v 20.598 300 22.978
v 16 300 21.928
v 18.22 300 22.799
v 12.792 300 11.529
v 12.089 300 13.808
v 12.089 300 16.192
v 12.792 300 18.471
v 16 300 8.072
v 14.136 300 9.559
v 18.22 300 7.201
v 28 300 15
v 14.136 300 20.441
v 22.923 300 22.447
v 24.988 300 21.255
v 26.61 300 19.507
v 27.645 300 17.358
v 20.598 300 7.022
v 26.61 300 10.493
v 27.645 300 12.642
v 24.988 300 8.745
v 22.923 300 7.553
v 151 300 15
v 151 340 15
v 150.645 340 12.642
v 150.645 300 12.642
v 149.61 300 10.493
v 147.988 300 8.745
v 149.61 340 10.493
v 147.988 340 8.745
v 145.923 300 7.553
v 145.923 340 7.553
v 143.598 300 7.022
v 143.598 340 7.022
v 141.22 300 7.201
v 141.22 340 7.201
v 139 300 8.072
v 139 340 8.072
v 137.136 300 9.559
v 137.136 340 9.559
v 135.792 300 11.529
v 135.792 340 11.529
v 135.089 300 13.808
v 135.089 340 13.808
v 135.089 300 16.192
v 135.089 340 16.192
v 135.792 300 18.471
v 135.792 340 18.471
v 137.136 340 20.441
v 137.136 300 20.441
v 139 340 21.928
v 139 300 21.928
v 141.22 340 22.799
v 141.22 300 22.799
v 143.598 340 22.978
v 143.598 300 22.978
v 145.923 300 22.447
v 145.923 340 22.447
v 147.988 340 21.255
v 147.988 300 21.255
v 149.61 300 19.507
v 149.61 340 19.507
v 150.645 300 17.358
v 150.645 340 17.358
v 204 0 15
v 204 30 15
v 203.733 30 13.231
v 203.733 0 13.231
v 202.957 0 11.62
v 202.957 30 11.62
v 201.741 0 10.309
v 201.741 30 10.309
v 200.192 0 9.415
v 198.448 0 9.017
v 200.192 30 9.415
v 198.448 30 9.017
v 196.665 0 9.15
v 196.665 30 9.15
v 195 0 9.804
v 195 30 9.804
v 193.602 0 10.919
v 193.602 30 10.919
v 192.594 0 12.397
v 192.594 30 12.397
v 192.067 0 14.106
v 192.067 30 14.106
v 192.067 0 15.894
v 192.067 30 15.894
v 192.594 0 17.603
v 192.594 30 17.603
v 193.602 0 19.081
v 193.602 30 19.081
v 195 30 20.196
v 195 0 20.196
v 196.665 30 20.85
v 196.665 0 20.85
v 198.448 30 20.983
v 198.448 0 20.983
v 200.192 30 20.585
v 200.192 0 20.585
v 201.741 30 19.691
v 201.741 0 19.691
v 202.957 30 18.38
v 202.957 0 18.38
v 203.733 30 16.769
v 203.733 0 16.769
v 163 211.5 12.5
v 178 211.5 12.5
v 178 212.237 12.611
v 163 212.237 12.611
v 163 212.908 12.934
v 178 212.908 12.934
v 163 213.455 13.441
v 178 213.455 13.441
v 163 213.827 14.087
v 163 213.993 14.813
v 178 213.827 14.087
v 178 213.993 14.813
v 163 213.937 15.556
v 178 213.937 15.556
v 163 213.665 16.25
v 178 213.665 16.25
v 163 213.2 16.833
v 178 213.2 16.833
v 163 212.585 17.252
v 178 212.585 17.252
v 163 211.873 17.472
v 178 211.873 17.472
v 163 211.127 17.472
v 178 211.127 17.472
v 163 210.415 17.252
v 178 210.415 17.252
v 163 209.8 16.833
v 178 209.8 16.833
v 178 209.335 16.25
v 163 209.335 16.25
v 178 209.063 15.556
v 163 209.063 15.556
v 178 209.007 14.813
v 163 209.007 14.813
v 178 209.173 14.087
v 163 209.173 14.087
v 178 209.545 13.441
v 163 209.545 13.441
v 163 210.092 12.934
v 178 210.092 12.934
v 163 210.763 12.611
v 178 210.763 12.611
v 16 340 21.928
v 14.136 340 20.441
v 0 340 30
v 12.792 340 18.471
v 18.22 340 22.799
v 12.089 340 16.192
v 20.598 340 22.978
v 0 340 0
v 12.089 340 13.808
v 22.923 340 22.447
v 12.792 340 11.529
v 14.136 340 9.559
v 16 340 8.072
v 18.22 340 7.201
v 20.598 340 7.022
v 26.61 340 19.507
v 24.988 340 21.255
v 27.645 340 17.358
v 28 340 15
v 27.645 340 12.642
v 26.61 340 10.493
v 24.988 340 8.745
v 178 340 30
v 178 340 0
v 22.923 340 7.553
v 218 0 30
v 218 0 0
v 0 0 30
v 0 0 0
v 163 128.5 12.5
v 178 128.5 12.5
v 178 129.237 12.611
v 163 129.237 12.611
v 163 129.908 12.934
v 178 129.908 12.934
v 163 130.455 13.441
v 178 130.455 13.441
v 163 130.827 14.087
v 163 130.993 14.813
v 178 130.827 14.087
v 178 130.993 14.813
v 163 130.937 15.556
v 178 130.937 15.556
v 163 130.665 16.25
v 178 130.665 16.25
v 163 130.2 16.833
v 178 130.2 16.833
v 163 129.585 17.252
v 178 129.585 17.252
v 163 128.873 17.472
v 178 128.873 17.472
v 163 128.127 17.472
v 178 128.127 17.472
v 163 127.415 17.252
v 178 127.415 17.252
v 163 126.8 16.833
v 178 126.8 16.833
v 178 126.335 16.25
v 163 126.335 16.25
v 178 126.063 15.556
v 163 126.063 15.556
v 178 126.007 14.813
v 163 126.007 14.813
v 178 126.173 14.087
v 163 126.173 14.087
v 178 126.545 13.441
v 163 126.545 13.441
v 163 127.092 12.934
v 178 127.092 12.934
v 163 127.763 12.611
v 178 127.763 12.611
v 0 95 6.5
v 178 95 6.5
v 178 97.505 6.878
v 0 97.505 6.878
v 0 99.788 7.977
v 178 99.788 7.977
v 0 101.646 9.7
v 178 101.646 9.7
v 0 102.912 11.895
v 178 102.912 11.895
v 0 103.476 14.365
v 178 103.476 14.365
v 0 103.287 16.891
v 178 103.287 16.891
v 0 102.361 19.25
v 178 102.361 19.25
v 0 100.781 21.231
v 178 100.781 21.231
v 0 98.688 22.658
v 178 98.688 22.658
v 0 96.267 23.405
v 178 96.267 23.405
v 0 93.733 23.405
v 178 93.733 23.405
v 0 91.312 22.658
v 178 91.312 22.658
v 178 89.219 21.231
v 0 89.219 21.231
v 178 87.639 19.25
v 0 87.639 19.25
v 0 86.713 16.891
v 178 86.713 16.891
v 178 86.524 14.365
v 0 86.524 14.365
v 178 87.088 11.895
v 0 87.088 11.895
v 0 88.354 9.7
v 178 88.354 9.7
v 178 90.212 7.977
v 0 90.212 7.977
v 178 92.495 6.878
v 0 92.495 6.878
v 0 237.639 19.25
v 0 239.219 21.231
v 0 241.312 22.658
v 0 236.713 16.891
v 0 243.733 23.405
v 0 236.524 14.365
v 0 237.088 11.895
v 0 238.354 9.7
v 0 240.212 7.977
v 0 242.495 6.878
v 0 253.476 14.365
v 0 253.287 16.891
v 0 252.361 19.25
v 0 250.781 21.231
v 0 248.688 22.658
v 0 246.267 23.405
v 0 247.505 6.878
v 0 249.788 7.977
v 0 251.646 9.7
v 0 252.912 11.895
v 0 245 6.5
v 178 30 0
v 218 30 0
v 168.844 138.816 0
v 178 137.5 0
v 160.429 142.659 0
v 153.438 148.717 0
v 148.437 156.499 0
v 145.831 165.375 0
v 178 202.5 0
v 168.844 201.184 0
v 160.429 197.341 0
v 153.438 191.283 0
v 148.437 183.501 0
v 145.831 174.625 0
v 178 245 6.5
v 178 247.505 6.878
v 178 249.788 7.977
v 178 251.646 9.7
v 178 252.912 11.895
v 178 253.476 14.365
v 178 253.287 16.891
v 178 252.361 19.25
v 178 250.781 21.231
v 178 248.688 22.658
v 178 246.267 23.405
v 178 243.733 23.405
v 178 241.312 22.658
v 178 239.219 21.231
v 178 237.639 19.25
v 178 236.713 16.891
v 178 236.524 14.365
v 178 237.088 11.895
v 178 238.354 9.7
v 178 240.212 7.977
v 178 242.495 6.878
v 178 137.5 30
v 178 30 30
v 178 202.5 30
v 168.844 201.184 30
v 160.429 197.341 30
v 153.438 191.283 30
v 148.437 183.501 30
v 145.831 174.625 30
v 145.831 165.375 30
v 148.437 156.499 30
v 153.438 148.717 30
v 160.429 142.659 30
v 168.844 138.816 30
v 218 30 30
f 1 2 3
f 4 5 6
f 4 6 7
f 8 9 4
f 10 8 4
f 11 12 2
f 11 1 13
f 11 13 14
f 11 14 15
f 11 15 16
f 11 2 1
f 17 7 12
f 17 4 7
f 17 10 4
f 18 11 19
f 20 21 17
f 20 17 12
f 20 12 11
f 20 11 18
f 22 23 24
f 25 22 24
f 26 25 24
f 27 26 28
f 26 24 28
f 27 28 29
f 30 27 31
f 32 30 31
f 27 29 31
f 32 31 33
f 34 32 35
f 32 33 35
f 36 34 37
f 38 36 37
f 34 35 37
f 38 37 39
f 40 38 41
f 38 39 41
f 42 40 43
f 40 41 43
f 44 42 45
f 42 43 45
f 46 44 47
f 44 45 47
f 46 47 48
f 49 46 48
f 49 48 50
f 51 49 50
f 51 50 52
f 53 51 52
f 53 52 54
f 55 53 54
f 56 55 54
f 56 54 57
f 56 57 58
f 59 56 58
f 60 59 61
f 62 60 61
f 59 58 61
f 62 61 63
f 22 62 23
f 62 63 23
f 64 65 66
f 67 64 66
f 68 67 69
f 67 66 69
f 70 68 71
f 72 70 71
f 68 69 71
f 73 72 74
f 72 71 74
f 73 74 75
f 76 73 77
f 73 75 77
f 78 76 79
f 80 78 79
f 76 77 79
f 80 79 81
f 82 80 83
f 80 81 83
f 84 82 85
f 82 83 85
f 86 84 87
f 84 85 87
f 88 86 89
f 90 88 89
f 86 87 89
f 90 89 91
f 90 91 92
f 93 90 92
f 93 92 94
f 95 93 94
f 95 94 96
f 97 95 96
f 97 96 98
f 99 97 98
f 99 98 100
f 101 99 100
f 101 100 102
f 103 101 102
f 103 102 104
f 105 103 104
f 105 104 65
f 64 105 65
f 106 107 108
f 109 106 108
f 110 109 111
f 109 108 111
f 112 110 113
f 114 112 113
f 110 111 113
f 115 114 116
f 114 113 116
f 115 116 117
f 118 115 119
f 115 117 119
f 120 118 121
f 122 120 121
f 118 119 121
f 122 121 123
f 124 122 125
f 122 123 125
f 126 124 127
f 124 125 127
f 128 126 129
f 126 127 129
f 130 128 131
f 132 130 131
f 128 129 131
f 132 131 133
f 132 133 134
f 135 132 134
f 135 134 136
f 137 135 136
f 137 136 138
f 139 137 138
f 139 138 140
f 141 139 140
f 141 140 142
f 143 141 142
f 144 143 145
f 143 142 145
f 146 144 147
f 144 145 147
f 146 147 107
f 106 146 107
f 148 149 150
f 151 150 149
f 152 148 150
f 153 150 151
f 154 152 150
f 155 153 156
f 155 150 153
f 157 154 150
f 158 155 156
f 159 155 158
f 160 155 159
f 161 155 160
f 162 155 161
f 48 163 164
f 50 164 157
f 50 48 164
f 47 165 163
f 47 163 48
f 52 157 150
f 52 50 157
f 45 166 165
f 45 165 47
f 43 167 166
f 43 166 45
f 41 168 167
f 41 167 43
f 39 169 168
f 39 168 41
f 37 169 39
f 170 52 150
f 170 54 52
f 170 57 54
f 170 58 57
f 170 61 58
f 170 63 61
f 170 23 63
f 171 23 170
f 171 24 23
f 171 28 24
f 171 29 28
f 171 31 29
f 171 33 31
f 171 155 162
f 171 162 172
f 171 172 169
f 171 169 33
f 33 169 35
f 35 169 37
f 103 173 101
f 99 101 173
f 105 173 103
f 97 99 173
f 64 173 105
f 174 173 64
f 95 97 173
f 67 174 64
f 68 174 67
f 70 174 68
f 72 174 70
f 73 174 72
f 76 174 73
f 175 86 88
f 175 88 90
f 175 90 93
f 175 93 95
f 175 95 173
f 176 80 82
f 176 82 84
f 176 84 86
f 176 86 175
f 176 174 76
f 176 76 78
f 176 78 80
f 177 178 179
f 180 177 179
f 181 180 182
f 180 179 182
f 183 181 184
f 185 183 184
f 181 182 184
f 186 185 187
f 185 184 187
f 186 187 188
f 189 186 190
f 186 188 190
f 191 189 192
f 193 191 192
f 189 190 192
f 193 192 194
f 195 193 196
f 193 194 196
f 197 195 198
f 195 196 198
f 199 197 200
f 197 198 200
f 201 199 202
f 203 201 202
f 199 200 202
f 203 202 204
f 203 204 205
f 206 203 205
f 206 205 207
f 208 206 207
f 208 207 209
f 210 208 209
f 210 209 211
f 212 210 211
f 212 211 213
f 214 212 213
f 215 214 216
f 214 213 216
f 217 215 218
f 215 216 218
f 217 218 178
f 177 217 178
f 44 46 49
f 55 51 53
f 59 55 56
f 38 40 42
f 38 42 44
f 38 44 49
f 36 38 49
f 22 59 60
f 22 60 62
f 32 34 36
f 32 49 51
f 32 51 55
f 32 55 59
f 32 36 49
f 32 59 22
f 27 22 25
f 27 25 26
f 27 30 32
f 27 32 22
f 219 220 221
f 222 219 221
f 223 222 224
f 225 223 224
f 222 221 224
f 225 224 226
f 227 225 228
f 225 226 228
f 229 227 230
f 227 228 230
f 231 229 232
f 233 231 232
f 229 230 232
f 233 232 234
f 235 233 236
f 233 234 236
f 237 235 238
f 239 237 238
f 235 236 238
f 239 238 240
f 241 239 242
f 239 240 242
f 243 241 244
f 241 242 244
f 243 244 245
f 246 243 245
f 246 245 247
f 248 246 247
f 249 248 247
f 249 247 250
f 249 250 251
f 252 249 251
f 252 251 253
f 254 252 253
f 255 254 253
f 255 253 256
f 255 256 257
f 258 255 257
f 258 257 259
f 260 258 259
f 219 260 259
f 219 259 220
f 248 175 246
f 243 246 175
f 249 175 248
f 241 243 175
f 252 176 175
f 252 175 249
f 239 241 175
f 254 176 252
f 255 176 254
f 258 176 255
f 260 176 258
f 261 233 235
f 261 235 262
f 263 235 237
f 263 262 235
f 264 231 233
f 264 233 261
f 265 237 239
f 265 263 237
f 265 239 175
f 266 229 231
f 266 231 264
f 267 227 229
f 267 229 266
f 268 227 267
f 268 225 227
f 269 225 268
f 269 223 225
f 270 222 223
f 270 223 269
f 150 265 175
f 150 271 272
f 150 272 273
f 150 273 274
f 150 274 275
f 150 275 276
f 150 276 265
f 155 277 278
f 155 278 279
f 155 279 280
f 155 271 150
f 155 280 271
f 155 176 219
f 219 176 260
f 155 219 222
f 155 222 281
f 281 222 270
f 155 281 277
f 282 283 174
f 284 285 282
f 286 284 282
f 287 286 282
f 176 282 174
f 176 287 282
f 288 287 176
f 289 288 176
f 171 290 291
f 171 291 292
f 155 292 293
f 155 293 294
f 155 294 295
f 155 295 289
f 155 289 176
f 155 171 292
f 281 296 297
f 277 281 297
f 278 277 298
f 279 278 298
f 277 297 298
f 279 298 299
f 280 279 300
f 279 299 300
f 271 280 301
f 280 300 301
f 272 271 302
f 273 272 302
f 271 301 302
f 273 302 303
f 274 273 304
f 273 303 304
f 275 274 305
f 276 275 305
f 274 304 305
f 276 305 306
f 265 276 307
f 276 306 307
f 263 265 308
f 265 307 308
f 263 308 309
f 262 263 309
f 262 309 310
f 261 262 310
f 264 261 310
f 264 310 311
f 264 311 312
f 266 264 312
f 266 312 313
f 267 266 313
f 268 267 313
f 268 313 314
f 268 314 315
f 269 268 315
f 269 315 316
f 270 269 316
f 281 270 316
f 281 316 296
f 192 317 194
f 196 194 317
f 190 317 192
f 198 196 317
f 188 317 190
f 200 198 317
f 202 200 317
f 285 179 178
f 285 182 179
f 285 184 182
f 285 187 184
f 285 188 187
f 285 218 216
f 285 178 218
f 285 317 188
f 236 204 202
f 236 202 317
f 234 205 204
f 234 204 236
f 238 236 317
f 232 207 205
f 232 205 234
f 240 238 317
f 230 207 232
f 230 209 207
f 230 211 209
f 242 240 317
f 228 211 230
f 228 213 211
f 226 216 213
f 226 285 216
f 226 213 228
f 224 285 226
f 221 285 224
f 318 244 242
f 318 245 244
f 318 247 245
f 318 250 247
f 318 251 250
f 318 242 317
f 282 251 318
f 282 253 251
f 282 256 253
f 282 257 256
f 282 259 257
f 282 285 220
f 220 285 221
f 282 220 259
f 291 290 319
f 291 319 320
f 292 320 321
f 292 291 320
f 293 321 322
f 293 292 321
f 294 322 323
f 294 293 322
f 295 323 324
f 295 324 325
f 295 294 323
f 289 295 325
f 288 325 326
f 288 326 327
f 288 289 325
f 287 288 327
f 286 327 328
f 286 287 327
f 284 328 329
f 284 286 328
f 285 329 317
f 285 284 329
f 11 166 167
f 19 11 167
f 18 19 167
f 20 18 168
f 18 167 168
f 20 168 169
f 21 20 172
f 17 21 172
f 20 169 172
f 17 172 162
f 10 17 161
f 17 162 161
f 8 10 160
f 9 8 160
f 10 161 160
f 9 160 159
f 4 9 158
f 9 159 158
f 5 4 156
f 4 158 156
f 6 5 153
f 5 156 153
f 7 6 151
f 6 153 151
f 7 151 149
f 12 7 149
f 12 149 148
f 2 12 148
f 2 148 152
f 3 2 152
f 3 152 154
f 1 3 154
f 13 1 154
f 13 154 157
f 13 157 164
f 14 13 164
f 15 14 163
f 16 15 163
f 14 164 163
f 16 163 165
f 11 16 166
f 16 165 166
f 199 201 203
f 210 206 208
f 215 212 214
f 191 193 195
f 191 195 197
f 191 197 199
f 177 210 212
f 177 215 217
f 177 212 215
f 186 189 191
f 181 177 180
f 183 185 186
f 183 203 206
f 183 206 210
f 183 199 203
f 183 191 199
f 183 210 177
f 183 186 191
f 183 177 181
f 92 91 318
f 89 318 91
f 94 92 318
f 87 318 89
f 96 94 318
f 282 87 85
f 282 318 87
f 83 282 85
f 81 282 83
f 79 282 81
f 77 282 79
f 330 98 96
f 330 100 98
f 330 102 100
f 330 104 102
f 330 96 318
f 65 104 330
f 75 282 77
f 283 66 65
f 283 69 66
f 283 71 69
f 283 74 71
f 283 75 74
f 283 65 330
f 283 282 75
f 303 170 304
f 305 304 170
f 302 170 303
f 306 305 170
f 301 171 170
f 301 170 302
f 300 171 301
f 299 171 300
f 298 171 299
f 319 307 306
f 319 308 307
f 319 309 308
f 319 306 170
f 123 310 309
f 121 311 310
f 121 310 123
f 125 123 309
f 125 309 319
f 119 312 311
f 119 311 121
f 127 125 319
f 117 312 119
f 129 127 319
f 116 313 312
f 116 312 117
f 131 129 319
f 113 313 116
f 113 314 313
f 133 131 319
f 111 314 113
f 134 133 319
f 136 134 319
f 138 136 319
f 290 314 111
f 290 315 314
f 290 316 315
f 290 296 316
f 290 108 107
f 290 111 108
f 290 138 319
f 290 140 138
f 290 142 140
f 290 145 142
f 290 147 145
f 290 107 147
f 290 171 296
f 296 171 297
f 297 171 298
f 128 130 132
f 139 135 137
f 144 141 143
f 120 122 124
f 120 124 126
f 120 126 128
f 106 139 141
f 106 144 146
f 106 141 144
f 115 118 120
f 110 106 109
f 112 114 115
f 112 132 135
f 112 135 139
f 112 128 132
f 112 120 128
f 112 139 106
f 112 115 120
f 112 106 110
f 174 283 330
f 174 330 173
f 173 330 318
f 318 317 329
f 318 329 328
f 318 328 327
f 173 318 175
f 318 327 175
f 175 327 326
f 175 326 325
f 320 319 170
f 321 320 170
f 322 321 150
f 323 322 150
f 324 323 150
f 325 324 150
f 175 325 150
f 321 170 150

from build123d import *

# Parameters (mm, degrees)
BOSS_EXTRUDE1_DEPTH = 30
SKETCH2_R           = 8.5
CUT_EXTRUDE1_DEPTH  = 179
LPATTERN1_COUNT     = 2
LPATTERN1_PITCH     = 150
SKETCH3_R           = 2.5
CUT_EXTRUDE2_DEPTH  = 15
LPATTERN2_COUNT     = 2
LPATTERN2_PITCH     = 83
SKETCH4_R           = 6
CUT_EXTRUDE3_DEPTH  = 31
SKETCH5_R           = 8
CUT_EXTRUDE4_DEPTH  = 40


with BuildPart() as part:
    # Sketch1 → Boss-Extrude1 (new body)
    with BuildSketch(Plane.XY):
        with BuildLine():
            Line((0, 0), (0, 340))
            Line((0, 340), (178, 340))
            Line((178, 340), (178, 202.5))
            ThreePointArc((178, 202.5), (145.5, 170), (178, 137.5))
            Line((178, 137.5), (178, 30))
            Line((178, 30), (218, 30))
            Line((218, 30), (218, 0))
            Line((218, 0), (0, 0))
        make_face()
    extrude(amount=BOSS_EXTRUDE1_DEPTH)

    # Sketch2 → Cut-Extrude1 (cut, through all)
    with BuildSketch(Plane(origin=(178, 0, 0), x_dir=(0, 0, -1), z_dir=(1, 0, 0))):
        with Locations((-15, 95)):
            Circle(SKETCH2_R)
    cut_extrude1 = extrude(amount=-CUT_EXTRUDE1_DEPTH, mode=Mode.SUBTRACT)

    # LPattern1: Cut-Extrude1 ×2
    with Locations(*[(0, i * LPATTERN1_PITCH, 0) for i in range(1, LPATTERN1_COUNT)]):
        add(cut_extrude1, mode=Mode.SUBTRACT)

    # Sketch3 → Cut-Extrude2 (cut)
    with BuildSketch(Plane(origin=(178, 0, 0), x_dir=(0, 0, -1), z_dir=(1, 0, 0))):
        with Locations((-15, 128.5)):
            Circle(SKETCH3_R)
    cut_extrude2 = extrude(amount=-CUT_EXTRUDE2_DEPTH, mode=Mode.SUBTRACT)

    # LPattern2: Cut-Extrude2 ×2
    with Locations(*[(0, i * LPATTERN2_PITCH, 0) for i in range(1, LPATTERN2_COUNT)]):
        add(cut_extrude2, mode=Mode.SUBTRACT)

    # Sketch4 → Cut-Extrude3 (cut, through all)
    with BuildSketch(Plane(origin=(0, 30, 0), x_dir=(1, 0, 0), z_dir=(0, 1, 0))):
        with Locations((198, -15)):
            Circle(SKETCH4_R)
    extrude(amount=-CUT_EXTRUDE3_DEPTH, mode=Mode.SUBTRACT)

    # Sketch5 → Cut-Extrude4 (cut)
    with BuildSketch(Plane(origin=(0, 340, 0), x_dir=(1, 0, 0), z_dir=(0, 1, 0))):
        with Locations((20, -15)):
            Circle(SKETCH5_R)
        with Locations((143, -15)):
            Circle(SKETCH5_R)
    extrude(amount=-CUT_EXTRUDE4_DEPTH, mode=Mode.SUBTRACT)


solid = part.part
